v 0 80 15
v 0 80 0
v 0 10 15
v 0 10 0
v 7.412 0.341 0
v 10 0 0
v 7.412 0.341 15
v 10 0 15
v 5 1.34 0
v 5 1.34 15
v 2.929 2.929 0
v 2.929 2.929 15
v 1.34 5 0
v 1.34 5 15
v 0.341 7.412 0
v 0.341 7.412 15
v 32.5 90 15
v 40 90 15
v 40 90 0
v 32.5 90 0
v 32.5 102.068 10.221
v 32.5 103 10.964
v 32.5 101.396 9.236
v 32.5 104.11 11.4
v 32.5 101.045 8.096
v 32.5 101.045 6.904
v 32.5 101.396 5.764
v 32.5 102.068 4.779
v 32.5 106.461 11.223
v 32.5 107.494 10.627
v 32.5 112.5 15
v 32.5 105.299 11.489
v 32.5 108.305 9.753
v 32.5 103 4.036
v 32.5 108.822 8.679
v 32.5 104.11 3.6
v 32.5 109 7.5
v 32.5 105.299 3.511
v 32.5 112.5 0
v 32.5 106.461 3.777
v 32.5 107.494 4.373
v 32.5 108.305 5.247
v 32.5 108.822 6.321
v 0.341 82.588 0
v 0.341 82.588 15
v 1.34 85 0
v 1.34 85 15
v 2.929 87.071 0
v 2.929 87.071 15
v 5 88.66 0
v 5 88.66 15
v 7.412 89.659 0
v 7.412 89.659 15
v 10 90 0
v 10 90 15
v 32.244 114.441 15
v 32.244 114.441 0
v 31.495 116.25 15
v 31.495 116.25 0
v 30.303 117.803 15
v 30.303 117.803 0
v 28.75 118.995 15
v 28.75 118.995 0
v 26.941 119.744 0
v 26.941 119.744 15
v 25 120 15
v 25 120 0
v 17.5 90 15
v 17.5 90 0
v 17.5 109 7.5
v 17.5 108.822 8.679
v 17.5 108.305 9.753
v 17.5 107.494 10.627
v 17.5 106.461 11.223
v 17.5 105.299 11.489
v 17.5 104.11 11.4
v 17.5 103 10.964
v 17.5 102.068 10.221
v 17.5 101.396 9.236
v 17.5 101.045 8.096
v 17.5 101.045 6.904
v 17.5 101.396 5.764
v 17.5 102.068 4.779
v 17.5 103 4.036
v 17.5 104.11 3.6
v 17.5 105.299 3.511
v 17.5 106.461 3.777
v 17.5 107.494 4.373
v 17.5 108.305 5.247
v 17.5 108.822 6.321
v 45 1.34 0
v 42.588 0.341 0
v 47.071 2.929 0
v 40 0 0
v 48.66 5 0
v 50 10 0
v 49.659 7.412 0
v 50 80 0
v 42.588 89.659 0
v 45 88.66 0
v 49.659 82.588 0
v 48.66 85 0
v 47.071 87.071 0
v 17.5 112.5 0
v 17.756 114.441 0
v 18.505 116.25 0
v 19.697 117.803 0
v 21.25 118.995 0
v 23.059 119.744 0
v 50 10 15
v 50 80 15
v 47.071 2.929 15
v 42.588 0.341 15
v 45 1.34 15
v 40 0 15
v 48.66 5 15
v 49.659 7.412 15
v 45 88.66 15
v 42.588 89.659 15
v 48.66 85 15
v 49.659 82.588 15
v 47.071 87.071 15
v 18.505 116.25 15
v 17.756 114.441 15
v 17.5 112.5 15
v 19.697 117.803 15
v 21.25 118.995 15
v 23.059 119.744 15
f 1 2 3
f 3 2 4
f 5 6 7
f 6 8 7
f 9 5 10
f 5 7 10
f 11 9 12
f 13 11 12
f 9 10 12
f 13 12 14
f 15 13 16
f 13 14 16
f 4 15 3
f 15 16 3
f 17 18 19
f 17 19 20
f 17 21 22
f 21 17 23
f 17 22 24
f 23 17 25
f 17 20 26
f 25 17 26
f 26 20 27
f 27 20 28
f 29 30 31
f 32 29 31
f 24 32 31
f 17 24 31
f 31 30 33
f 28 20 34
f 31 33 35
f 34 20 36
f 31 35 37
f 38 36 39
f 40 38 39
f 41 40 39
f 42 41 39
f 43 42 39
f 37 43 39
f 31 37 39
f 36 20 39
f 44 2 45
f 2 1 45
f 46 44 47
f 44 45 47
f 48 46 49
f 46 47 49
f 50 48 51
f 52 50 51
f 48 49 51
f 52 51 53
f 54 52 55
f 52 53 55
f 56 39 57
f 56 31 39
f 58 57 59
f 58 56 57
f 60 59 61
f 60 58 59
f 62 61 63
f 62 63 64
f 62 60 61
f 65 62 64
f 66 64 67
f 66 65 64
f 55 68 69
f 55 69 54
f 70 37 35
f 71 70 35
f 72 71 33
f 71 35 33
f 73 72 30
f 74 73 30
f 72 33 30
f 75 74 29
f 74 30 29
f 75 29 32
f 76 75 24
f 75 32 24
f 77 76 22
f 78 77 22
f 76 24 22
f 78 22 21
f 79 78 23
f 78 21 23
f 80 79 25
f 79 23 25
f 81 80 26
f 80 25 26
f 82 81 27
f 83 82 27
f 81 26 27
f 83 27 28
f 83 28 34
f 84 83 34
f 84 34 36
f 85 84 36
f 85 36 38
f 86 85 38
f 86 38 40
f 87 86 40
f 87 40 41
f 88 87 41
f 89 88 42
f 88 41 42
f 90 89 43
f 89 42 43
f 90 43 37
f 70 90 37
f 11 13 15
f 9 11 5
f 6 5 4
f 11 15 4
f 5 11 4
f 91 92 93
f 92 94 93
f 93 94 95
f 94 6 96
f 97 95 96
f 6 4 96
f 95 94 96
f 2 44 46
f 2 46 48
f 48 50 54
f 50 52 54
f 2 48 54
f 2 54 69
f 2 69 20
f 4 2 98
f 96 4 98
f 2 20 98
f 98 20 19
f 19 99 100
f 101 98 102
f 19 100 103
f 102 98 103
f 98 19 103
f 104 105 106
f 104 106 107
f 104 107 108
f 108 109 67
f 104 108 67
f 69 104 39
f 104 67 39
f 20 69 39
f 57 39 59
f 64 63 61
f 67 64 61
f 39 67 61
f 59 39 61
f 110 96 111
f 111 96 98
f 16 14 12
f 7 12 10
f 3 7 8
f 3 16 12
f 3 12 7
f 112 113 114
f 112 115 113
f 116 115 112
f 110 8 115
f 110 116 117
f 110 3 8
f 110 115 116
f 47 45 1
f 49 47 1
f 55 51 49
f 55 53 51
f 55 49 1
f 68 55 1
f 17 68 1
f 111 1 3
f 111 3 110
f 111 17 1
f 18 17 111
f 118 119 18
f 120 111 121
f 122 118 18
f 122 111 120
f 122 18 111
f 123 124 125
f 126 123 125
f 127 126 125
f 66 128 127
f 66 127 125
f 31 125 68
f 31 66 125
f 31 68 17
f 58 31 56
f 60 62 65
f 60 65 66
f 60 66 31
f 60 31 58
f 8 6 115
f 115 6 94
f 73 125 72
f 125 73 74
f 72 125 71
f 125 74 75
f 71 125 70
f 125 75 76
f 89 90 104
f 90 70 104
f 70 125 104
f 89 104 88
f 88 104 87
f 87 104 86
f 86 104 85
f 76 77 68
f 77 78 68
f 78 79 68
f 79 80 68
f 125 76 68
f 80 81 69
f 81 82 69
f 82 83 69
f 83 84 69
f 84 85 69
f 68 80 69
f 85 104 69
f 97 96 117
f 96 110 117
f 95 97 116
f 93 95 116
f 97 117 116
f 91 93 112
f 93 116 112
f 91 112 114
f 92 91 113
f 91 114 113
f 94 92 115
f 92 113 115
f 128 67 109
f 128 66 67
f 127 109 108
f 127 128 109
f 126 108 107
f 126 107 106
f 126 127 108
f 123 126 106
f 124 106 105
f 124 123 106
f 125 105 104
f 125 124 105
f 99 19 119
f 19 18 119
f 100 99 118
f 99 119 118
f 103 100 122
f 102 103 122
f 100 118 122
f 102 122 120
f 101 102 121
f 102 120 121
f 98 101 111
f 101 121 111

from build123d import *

# Parameters (mm, degrees)
F1_DEPTH = 15
F2_R     = 7.49999
F3_R     = 10
F4_R     = 4
F5_DEPTH = 15


# Not quite as in the source:
# - a fillet or chamfer is up to 0.001 mm smaller than in the source, because OpenCascade refuses the exact size


with BuildPart() as f1:
    # F0 (on Top) → F1 (new body)
    with BuildSketch(Plane.XY):
        Polygon((0, 90), (0, 0), (50, 0), (50, 90), (32.5, 90), (32.5, 120), (17.5, 120), (17.5, 90), align=None)
    extrude(amount=F1_DEPTH)

    # F2 (radius 7.5 in the source; OpenCascade refuses exactly that, so slightly less here)
    f2_edges = [f1.edges().sort_by_distance(p)[0] for p in [
        (17.5, 120, 7.5),
        (32.5, 120, 7.5),
    ]]
    fillet(f2_edges, radius=F2_R)

    # F3
    f3_edges = [f1.edges().sort_by_distance(p)[0] for p in [
        (0, 90, 7.5),
        (50, 90, 7.5),
        (50, 0, 7.5),
        (0, 0, 7.5),
    ]]
    fillet(f3_edges, radius=F3_R)

    # F4 (on face) → F5 (cut)
    with BuildSketch(Plane.YZ.offset(32.5)):
        with Locations((105, 7.5)):
            Circle(F4_R)
    extrude(amount=-F5_DEPTH, mode=Mode.SUBTRACT)


solid = f1.part
